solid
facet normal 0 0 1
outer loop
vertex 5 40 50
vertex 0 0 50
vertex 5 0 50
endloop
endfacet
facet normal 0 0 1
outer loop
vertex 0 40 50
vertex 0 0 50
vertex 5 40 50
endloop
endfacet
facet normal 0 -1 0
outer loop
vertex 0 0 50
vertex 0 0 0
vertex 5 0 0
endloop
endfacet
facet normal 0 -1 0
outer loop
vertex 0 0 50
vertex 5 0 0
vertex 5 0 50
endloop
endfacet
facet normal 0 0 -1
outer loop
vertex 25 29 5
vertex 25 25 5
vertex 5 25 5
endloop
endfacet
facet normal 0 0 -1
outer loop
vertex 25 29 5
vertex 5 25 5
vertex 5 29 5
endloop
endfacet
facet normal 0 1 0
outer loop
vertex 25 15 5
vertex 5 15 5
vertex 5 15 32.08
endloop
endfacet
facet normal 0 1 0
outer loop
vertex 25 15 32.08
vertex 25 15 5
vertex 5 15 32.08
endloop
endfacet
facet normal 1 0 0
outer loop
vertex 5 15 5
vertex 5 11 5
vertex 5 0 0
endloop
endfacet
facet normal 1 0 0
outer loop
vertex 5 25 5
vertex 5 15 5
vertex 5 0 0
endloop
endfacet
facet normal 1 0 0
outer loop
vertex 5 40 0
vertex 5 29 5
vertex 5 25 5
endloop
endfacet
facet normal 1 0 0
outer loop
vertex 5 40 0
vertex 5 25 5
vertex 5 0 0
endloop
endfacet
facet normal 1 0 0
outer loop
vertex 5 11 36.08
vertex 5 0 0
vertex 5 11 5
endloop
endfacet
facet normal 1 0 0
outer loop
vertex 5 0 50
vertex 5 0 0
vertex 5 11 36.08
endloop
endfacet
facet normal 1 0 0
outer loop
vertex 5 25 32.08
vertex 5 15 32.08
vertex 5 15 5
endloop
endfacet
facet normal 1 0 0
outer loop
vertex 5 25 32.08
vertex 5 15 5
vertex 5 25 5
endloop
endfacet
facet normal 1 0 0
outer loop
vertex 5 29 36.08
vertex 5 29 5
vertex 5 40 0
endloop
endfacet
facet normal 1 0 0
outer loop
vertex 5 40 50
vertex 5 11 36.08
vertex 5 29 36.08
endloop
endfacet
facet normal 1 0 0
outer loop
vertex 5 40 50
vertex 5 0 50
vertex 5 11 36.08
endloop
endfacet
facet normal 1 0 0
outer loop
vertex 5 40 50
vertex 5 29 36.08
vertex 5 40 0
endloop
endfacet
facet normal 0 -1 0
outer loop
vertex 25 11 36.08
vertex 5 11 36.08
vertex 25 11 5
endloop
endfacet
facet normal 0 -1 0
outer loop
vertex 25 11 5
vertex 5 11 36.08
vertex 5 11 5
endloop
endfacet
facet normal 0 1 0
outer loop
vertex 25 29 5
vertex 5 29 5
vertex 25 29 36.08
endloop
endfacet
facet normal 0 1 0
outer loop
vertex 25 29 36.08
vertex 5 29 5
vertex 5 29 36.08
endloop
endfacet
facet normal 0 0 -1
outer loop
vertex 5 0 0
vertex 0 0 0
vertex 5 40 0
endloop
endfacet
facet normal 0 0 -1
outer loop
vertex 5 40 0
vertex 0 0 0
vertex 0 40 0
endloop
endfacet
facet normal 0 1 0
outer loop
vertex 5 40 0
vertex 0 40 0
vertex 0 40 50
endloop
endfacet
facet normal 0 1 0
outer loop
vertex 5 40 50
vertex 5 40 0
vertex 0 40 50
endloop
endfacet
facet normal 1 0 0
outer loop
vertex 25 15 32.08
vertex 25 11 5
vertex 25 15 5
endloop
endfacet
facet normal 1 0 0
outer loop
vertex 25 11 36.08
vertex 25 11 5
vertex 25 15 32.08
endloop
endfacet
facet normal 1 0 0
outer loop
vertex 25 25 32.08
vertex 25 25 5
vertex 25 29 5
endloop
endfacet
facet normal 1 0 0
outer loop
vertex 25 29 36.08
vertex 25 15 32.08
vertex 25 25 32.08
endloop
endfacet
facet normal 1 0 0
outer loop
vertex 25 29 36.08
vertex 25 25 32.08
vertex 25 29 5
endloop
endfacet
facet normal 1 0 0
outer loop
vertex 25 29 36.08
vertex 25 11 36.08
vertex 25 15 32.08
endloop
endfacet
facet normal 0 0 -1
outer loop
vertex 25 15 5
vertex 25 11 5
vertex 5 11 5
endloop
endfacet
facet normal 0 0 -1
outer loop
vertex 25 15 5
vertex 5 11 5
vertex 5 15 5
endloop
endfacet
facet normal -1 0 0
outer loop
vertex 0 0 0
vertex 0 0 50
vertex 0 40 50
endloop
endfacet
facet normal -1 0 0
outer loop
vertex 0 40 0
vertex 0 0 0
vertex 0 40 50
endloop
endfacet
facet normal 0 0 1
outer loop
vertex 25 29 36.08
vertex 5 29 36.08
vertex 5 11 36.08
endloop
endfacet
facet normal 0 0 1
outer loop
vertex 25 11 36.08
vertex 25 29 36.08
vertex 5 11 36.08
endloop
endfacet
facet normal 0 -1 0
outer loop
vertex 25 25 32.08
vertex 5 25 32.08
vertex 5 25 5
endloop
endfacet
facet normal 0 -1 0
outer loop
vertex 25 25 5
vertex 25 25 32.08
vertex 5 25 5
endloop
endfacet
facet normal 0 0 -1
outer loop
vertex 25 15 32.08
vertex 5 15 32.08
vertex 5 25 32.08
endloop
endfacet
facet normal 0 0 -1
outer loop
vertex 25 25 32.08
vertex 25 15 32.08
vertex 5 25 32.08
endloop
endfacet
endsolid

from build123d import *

# Parameters (mm, degrees)
F0_W     = 40
F0_H     = 50
F1_DEPTH = 5
F3_DEPTH = 20


with BuildPart() as f1:
    # F0 (on Right) → F1 (new body)
    with BuildSketch(Plane.YZ):
        with Locations((20, 25)):
            Rectangle(F0_W, F0_H)
    extrude(amount=F1_DEPTH)

    # F2 (on face) → F3 (join)
    with BuildSketch(Plane.YZ.offset(5)):
        Polygon((11, 36.08), (11, 5), (15, 5), (15, 32.08), (25, 32.08), (25, 5), (29, 5), (29, 36.08), align=None)
    extrude(amount=F3_DEPTH)


solid = f1.part
